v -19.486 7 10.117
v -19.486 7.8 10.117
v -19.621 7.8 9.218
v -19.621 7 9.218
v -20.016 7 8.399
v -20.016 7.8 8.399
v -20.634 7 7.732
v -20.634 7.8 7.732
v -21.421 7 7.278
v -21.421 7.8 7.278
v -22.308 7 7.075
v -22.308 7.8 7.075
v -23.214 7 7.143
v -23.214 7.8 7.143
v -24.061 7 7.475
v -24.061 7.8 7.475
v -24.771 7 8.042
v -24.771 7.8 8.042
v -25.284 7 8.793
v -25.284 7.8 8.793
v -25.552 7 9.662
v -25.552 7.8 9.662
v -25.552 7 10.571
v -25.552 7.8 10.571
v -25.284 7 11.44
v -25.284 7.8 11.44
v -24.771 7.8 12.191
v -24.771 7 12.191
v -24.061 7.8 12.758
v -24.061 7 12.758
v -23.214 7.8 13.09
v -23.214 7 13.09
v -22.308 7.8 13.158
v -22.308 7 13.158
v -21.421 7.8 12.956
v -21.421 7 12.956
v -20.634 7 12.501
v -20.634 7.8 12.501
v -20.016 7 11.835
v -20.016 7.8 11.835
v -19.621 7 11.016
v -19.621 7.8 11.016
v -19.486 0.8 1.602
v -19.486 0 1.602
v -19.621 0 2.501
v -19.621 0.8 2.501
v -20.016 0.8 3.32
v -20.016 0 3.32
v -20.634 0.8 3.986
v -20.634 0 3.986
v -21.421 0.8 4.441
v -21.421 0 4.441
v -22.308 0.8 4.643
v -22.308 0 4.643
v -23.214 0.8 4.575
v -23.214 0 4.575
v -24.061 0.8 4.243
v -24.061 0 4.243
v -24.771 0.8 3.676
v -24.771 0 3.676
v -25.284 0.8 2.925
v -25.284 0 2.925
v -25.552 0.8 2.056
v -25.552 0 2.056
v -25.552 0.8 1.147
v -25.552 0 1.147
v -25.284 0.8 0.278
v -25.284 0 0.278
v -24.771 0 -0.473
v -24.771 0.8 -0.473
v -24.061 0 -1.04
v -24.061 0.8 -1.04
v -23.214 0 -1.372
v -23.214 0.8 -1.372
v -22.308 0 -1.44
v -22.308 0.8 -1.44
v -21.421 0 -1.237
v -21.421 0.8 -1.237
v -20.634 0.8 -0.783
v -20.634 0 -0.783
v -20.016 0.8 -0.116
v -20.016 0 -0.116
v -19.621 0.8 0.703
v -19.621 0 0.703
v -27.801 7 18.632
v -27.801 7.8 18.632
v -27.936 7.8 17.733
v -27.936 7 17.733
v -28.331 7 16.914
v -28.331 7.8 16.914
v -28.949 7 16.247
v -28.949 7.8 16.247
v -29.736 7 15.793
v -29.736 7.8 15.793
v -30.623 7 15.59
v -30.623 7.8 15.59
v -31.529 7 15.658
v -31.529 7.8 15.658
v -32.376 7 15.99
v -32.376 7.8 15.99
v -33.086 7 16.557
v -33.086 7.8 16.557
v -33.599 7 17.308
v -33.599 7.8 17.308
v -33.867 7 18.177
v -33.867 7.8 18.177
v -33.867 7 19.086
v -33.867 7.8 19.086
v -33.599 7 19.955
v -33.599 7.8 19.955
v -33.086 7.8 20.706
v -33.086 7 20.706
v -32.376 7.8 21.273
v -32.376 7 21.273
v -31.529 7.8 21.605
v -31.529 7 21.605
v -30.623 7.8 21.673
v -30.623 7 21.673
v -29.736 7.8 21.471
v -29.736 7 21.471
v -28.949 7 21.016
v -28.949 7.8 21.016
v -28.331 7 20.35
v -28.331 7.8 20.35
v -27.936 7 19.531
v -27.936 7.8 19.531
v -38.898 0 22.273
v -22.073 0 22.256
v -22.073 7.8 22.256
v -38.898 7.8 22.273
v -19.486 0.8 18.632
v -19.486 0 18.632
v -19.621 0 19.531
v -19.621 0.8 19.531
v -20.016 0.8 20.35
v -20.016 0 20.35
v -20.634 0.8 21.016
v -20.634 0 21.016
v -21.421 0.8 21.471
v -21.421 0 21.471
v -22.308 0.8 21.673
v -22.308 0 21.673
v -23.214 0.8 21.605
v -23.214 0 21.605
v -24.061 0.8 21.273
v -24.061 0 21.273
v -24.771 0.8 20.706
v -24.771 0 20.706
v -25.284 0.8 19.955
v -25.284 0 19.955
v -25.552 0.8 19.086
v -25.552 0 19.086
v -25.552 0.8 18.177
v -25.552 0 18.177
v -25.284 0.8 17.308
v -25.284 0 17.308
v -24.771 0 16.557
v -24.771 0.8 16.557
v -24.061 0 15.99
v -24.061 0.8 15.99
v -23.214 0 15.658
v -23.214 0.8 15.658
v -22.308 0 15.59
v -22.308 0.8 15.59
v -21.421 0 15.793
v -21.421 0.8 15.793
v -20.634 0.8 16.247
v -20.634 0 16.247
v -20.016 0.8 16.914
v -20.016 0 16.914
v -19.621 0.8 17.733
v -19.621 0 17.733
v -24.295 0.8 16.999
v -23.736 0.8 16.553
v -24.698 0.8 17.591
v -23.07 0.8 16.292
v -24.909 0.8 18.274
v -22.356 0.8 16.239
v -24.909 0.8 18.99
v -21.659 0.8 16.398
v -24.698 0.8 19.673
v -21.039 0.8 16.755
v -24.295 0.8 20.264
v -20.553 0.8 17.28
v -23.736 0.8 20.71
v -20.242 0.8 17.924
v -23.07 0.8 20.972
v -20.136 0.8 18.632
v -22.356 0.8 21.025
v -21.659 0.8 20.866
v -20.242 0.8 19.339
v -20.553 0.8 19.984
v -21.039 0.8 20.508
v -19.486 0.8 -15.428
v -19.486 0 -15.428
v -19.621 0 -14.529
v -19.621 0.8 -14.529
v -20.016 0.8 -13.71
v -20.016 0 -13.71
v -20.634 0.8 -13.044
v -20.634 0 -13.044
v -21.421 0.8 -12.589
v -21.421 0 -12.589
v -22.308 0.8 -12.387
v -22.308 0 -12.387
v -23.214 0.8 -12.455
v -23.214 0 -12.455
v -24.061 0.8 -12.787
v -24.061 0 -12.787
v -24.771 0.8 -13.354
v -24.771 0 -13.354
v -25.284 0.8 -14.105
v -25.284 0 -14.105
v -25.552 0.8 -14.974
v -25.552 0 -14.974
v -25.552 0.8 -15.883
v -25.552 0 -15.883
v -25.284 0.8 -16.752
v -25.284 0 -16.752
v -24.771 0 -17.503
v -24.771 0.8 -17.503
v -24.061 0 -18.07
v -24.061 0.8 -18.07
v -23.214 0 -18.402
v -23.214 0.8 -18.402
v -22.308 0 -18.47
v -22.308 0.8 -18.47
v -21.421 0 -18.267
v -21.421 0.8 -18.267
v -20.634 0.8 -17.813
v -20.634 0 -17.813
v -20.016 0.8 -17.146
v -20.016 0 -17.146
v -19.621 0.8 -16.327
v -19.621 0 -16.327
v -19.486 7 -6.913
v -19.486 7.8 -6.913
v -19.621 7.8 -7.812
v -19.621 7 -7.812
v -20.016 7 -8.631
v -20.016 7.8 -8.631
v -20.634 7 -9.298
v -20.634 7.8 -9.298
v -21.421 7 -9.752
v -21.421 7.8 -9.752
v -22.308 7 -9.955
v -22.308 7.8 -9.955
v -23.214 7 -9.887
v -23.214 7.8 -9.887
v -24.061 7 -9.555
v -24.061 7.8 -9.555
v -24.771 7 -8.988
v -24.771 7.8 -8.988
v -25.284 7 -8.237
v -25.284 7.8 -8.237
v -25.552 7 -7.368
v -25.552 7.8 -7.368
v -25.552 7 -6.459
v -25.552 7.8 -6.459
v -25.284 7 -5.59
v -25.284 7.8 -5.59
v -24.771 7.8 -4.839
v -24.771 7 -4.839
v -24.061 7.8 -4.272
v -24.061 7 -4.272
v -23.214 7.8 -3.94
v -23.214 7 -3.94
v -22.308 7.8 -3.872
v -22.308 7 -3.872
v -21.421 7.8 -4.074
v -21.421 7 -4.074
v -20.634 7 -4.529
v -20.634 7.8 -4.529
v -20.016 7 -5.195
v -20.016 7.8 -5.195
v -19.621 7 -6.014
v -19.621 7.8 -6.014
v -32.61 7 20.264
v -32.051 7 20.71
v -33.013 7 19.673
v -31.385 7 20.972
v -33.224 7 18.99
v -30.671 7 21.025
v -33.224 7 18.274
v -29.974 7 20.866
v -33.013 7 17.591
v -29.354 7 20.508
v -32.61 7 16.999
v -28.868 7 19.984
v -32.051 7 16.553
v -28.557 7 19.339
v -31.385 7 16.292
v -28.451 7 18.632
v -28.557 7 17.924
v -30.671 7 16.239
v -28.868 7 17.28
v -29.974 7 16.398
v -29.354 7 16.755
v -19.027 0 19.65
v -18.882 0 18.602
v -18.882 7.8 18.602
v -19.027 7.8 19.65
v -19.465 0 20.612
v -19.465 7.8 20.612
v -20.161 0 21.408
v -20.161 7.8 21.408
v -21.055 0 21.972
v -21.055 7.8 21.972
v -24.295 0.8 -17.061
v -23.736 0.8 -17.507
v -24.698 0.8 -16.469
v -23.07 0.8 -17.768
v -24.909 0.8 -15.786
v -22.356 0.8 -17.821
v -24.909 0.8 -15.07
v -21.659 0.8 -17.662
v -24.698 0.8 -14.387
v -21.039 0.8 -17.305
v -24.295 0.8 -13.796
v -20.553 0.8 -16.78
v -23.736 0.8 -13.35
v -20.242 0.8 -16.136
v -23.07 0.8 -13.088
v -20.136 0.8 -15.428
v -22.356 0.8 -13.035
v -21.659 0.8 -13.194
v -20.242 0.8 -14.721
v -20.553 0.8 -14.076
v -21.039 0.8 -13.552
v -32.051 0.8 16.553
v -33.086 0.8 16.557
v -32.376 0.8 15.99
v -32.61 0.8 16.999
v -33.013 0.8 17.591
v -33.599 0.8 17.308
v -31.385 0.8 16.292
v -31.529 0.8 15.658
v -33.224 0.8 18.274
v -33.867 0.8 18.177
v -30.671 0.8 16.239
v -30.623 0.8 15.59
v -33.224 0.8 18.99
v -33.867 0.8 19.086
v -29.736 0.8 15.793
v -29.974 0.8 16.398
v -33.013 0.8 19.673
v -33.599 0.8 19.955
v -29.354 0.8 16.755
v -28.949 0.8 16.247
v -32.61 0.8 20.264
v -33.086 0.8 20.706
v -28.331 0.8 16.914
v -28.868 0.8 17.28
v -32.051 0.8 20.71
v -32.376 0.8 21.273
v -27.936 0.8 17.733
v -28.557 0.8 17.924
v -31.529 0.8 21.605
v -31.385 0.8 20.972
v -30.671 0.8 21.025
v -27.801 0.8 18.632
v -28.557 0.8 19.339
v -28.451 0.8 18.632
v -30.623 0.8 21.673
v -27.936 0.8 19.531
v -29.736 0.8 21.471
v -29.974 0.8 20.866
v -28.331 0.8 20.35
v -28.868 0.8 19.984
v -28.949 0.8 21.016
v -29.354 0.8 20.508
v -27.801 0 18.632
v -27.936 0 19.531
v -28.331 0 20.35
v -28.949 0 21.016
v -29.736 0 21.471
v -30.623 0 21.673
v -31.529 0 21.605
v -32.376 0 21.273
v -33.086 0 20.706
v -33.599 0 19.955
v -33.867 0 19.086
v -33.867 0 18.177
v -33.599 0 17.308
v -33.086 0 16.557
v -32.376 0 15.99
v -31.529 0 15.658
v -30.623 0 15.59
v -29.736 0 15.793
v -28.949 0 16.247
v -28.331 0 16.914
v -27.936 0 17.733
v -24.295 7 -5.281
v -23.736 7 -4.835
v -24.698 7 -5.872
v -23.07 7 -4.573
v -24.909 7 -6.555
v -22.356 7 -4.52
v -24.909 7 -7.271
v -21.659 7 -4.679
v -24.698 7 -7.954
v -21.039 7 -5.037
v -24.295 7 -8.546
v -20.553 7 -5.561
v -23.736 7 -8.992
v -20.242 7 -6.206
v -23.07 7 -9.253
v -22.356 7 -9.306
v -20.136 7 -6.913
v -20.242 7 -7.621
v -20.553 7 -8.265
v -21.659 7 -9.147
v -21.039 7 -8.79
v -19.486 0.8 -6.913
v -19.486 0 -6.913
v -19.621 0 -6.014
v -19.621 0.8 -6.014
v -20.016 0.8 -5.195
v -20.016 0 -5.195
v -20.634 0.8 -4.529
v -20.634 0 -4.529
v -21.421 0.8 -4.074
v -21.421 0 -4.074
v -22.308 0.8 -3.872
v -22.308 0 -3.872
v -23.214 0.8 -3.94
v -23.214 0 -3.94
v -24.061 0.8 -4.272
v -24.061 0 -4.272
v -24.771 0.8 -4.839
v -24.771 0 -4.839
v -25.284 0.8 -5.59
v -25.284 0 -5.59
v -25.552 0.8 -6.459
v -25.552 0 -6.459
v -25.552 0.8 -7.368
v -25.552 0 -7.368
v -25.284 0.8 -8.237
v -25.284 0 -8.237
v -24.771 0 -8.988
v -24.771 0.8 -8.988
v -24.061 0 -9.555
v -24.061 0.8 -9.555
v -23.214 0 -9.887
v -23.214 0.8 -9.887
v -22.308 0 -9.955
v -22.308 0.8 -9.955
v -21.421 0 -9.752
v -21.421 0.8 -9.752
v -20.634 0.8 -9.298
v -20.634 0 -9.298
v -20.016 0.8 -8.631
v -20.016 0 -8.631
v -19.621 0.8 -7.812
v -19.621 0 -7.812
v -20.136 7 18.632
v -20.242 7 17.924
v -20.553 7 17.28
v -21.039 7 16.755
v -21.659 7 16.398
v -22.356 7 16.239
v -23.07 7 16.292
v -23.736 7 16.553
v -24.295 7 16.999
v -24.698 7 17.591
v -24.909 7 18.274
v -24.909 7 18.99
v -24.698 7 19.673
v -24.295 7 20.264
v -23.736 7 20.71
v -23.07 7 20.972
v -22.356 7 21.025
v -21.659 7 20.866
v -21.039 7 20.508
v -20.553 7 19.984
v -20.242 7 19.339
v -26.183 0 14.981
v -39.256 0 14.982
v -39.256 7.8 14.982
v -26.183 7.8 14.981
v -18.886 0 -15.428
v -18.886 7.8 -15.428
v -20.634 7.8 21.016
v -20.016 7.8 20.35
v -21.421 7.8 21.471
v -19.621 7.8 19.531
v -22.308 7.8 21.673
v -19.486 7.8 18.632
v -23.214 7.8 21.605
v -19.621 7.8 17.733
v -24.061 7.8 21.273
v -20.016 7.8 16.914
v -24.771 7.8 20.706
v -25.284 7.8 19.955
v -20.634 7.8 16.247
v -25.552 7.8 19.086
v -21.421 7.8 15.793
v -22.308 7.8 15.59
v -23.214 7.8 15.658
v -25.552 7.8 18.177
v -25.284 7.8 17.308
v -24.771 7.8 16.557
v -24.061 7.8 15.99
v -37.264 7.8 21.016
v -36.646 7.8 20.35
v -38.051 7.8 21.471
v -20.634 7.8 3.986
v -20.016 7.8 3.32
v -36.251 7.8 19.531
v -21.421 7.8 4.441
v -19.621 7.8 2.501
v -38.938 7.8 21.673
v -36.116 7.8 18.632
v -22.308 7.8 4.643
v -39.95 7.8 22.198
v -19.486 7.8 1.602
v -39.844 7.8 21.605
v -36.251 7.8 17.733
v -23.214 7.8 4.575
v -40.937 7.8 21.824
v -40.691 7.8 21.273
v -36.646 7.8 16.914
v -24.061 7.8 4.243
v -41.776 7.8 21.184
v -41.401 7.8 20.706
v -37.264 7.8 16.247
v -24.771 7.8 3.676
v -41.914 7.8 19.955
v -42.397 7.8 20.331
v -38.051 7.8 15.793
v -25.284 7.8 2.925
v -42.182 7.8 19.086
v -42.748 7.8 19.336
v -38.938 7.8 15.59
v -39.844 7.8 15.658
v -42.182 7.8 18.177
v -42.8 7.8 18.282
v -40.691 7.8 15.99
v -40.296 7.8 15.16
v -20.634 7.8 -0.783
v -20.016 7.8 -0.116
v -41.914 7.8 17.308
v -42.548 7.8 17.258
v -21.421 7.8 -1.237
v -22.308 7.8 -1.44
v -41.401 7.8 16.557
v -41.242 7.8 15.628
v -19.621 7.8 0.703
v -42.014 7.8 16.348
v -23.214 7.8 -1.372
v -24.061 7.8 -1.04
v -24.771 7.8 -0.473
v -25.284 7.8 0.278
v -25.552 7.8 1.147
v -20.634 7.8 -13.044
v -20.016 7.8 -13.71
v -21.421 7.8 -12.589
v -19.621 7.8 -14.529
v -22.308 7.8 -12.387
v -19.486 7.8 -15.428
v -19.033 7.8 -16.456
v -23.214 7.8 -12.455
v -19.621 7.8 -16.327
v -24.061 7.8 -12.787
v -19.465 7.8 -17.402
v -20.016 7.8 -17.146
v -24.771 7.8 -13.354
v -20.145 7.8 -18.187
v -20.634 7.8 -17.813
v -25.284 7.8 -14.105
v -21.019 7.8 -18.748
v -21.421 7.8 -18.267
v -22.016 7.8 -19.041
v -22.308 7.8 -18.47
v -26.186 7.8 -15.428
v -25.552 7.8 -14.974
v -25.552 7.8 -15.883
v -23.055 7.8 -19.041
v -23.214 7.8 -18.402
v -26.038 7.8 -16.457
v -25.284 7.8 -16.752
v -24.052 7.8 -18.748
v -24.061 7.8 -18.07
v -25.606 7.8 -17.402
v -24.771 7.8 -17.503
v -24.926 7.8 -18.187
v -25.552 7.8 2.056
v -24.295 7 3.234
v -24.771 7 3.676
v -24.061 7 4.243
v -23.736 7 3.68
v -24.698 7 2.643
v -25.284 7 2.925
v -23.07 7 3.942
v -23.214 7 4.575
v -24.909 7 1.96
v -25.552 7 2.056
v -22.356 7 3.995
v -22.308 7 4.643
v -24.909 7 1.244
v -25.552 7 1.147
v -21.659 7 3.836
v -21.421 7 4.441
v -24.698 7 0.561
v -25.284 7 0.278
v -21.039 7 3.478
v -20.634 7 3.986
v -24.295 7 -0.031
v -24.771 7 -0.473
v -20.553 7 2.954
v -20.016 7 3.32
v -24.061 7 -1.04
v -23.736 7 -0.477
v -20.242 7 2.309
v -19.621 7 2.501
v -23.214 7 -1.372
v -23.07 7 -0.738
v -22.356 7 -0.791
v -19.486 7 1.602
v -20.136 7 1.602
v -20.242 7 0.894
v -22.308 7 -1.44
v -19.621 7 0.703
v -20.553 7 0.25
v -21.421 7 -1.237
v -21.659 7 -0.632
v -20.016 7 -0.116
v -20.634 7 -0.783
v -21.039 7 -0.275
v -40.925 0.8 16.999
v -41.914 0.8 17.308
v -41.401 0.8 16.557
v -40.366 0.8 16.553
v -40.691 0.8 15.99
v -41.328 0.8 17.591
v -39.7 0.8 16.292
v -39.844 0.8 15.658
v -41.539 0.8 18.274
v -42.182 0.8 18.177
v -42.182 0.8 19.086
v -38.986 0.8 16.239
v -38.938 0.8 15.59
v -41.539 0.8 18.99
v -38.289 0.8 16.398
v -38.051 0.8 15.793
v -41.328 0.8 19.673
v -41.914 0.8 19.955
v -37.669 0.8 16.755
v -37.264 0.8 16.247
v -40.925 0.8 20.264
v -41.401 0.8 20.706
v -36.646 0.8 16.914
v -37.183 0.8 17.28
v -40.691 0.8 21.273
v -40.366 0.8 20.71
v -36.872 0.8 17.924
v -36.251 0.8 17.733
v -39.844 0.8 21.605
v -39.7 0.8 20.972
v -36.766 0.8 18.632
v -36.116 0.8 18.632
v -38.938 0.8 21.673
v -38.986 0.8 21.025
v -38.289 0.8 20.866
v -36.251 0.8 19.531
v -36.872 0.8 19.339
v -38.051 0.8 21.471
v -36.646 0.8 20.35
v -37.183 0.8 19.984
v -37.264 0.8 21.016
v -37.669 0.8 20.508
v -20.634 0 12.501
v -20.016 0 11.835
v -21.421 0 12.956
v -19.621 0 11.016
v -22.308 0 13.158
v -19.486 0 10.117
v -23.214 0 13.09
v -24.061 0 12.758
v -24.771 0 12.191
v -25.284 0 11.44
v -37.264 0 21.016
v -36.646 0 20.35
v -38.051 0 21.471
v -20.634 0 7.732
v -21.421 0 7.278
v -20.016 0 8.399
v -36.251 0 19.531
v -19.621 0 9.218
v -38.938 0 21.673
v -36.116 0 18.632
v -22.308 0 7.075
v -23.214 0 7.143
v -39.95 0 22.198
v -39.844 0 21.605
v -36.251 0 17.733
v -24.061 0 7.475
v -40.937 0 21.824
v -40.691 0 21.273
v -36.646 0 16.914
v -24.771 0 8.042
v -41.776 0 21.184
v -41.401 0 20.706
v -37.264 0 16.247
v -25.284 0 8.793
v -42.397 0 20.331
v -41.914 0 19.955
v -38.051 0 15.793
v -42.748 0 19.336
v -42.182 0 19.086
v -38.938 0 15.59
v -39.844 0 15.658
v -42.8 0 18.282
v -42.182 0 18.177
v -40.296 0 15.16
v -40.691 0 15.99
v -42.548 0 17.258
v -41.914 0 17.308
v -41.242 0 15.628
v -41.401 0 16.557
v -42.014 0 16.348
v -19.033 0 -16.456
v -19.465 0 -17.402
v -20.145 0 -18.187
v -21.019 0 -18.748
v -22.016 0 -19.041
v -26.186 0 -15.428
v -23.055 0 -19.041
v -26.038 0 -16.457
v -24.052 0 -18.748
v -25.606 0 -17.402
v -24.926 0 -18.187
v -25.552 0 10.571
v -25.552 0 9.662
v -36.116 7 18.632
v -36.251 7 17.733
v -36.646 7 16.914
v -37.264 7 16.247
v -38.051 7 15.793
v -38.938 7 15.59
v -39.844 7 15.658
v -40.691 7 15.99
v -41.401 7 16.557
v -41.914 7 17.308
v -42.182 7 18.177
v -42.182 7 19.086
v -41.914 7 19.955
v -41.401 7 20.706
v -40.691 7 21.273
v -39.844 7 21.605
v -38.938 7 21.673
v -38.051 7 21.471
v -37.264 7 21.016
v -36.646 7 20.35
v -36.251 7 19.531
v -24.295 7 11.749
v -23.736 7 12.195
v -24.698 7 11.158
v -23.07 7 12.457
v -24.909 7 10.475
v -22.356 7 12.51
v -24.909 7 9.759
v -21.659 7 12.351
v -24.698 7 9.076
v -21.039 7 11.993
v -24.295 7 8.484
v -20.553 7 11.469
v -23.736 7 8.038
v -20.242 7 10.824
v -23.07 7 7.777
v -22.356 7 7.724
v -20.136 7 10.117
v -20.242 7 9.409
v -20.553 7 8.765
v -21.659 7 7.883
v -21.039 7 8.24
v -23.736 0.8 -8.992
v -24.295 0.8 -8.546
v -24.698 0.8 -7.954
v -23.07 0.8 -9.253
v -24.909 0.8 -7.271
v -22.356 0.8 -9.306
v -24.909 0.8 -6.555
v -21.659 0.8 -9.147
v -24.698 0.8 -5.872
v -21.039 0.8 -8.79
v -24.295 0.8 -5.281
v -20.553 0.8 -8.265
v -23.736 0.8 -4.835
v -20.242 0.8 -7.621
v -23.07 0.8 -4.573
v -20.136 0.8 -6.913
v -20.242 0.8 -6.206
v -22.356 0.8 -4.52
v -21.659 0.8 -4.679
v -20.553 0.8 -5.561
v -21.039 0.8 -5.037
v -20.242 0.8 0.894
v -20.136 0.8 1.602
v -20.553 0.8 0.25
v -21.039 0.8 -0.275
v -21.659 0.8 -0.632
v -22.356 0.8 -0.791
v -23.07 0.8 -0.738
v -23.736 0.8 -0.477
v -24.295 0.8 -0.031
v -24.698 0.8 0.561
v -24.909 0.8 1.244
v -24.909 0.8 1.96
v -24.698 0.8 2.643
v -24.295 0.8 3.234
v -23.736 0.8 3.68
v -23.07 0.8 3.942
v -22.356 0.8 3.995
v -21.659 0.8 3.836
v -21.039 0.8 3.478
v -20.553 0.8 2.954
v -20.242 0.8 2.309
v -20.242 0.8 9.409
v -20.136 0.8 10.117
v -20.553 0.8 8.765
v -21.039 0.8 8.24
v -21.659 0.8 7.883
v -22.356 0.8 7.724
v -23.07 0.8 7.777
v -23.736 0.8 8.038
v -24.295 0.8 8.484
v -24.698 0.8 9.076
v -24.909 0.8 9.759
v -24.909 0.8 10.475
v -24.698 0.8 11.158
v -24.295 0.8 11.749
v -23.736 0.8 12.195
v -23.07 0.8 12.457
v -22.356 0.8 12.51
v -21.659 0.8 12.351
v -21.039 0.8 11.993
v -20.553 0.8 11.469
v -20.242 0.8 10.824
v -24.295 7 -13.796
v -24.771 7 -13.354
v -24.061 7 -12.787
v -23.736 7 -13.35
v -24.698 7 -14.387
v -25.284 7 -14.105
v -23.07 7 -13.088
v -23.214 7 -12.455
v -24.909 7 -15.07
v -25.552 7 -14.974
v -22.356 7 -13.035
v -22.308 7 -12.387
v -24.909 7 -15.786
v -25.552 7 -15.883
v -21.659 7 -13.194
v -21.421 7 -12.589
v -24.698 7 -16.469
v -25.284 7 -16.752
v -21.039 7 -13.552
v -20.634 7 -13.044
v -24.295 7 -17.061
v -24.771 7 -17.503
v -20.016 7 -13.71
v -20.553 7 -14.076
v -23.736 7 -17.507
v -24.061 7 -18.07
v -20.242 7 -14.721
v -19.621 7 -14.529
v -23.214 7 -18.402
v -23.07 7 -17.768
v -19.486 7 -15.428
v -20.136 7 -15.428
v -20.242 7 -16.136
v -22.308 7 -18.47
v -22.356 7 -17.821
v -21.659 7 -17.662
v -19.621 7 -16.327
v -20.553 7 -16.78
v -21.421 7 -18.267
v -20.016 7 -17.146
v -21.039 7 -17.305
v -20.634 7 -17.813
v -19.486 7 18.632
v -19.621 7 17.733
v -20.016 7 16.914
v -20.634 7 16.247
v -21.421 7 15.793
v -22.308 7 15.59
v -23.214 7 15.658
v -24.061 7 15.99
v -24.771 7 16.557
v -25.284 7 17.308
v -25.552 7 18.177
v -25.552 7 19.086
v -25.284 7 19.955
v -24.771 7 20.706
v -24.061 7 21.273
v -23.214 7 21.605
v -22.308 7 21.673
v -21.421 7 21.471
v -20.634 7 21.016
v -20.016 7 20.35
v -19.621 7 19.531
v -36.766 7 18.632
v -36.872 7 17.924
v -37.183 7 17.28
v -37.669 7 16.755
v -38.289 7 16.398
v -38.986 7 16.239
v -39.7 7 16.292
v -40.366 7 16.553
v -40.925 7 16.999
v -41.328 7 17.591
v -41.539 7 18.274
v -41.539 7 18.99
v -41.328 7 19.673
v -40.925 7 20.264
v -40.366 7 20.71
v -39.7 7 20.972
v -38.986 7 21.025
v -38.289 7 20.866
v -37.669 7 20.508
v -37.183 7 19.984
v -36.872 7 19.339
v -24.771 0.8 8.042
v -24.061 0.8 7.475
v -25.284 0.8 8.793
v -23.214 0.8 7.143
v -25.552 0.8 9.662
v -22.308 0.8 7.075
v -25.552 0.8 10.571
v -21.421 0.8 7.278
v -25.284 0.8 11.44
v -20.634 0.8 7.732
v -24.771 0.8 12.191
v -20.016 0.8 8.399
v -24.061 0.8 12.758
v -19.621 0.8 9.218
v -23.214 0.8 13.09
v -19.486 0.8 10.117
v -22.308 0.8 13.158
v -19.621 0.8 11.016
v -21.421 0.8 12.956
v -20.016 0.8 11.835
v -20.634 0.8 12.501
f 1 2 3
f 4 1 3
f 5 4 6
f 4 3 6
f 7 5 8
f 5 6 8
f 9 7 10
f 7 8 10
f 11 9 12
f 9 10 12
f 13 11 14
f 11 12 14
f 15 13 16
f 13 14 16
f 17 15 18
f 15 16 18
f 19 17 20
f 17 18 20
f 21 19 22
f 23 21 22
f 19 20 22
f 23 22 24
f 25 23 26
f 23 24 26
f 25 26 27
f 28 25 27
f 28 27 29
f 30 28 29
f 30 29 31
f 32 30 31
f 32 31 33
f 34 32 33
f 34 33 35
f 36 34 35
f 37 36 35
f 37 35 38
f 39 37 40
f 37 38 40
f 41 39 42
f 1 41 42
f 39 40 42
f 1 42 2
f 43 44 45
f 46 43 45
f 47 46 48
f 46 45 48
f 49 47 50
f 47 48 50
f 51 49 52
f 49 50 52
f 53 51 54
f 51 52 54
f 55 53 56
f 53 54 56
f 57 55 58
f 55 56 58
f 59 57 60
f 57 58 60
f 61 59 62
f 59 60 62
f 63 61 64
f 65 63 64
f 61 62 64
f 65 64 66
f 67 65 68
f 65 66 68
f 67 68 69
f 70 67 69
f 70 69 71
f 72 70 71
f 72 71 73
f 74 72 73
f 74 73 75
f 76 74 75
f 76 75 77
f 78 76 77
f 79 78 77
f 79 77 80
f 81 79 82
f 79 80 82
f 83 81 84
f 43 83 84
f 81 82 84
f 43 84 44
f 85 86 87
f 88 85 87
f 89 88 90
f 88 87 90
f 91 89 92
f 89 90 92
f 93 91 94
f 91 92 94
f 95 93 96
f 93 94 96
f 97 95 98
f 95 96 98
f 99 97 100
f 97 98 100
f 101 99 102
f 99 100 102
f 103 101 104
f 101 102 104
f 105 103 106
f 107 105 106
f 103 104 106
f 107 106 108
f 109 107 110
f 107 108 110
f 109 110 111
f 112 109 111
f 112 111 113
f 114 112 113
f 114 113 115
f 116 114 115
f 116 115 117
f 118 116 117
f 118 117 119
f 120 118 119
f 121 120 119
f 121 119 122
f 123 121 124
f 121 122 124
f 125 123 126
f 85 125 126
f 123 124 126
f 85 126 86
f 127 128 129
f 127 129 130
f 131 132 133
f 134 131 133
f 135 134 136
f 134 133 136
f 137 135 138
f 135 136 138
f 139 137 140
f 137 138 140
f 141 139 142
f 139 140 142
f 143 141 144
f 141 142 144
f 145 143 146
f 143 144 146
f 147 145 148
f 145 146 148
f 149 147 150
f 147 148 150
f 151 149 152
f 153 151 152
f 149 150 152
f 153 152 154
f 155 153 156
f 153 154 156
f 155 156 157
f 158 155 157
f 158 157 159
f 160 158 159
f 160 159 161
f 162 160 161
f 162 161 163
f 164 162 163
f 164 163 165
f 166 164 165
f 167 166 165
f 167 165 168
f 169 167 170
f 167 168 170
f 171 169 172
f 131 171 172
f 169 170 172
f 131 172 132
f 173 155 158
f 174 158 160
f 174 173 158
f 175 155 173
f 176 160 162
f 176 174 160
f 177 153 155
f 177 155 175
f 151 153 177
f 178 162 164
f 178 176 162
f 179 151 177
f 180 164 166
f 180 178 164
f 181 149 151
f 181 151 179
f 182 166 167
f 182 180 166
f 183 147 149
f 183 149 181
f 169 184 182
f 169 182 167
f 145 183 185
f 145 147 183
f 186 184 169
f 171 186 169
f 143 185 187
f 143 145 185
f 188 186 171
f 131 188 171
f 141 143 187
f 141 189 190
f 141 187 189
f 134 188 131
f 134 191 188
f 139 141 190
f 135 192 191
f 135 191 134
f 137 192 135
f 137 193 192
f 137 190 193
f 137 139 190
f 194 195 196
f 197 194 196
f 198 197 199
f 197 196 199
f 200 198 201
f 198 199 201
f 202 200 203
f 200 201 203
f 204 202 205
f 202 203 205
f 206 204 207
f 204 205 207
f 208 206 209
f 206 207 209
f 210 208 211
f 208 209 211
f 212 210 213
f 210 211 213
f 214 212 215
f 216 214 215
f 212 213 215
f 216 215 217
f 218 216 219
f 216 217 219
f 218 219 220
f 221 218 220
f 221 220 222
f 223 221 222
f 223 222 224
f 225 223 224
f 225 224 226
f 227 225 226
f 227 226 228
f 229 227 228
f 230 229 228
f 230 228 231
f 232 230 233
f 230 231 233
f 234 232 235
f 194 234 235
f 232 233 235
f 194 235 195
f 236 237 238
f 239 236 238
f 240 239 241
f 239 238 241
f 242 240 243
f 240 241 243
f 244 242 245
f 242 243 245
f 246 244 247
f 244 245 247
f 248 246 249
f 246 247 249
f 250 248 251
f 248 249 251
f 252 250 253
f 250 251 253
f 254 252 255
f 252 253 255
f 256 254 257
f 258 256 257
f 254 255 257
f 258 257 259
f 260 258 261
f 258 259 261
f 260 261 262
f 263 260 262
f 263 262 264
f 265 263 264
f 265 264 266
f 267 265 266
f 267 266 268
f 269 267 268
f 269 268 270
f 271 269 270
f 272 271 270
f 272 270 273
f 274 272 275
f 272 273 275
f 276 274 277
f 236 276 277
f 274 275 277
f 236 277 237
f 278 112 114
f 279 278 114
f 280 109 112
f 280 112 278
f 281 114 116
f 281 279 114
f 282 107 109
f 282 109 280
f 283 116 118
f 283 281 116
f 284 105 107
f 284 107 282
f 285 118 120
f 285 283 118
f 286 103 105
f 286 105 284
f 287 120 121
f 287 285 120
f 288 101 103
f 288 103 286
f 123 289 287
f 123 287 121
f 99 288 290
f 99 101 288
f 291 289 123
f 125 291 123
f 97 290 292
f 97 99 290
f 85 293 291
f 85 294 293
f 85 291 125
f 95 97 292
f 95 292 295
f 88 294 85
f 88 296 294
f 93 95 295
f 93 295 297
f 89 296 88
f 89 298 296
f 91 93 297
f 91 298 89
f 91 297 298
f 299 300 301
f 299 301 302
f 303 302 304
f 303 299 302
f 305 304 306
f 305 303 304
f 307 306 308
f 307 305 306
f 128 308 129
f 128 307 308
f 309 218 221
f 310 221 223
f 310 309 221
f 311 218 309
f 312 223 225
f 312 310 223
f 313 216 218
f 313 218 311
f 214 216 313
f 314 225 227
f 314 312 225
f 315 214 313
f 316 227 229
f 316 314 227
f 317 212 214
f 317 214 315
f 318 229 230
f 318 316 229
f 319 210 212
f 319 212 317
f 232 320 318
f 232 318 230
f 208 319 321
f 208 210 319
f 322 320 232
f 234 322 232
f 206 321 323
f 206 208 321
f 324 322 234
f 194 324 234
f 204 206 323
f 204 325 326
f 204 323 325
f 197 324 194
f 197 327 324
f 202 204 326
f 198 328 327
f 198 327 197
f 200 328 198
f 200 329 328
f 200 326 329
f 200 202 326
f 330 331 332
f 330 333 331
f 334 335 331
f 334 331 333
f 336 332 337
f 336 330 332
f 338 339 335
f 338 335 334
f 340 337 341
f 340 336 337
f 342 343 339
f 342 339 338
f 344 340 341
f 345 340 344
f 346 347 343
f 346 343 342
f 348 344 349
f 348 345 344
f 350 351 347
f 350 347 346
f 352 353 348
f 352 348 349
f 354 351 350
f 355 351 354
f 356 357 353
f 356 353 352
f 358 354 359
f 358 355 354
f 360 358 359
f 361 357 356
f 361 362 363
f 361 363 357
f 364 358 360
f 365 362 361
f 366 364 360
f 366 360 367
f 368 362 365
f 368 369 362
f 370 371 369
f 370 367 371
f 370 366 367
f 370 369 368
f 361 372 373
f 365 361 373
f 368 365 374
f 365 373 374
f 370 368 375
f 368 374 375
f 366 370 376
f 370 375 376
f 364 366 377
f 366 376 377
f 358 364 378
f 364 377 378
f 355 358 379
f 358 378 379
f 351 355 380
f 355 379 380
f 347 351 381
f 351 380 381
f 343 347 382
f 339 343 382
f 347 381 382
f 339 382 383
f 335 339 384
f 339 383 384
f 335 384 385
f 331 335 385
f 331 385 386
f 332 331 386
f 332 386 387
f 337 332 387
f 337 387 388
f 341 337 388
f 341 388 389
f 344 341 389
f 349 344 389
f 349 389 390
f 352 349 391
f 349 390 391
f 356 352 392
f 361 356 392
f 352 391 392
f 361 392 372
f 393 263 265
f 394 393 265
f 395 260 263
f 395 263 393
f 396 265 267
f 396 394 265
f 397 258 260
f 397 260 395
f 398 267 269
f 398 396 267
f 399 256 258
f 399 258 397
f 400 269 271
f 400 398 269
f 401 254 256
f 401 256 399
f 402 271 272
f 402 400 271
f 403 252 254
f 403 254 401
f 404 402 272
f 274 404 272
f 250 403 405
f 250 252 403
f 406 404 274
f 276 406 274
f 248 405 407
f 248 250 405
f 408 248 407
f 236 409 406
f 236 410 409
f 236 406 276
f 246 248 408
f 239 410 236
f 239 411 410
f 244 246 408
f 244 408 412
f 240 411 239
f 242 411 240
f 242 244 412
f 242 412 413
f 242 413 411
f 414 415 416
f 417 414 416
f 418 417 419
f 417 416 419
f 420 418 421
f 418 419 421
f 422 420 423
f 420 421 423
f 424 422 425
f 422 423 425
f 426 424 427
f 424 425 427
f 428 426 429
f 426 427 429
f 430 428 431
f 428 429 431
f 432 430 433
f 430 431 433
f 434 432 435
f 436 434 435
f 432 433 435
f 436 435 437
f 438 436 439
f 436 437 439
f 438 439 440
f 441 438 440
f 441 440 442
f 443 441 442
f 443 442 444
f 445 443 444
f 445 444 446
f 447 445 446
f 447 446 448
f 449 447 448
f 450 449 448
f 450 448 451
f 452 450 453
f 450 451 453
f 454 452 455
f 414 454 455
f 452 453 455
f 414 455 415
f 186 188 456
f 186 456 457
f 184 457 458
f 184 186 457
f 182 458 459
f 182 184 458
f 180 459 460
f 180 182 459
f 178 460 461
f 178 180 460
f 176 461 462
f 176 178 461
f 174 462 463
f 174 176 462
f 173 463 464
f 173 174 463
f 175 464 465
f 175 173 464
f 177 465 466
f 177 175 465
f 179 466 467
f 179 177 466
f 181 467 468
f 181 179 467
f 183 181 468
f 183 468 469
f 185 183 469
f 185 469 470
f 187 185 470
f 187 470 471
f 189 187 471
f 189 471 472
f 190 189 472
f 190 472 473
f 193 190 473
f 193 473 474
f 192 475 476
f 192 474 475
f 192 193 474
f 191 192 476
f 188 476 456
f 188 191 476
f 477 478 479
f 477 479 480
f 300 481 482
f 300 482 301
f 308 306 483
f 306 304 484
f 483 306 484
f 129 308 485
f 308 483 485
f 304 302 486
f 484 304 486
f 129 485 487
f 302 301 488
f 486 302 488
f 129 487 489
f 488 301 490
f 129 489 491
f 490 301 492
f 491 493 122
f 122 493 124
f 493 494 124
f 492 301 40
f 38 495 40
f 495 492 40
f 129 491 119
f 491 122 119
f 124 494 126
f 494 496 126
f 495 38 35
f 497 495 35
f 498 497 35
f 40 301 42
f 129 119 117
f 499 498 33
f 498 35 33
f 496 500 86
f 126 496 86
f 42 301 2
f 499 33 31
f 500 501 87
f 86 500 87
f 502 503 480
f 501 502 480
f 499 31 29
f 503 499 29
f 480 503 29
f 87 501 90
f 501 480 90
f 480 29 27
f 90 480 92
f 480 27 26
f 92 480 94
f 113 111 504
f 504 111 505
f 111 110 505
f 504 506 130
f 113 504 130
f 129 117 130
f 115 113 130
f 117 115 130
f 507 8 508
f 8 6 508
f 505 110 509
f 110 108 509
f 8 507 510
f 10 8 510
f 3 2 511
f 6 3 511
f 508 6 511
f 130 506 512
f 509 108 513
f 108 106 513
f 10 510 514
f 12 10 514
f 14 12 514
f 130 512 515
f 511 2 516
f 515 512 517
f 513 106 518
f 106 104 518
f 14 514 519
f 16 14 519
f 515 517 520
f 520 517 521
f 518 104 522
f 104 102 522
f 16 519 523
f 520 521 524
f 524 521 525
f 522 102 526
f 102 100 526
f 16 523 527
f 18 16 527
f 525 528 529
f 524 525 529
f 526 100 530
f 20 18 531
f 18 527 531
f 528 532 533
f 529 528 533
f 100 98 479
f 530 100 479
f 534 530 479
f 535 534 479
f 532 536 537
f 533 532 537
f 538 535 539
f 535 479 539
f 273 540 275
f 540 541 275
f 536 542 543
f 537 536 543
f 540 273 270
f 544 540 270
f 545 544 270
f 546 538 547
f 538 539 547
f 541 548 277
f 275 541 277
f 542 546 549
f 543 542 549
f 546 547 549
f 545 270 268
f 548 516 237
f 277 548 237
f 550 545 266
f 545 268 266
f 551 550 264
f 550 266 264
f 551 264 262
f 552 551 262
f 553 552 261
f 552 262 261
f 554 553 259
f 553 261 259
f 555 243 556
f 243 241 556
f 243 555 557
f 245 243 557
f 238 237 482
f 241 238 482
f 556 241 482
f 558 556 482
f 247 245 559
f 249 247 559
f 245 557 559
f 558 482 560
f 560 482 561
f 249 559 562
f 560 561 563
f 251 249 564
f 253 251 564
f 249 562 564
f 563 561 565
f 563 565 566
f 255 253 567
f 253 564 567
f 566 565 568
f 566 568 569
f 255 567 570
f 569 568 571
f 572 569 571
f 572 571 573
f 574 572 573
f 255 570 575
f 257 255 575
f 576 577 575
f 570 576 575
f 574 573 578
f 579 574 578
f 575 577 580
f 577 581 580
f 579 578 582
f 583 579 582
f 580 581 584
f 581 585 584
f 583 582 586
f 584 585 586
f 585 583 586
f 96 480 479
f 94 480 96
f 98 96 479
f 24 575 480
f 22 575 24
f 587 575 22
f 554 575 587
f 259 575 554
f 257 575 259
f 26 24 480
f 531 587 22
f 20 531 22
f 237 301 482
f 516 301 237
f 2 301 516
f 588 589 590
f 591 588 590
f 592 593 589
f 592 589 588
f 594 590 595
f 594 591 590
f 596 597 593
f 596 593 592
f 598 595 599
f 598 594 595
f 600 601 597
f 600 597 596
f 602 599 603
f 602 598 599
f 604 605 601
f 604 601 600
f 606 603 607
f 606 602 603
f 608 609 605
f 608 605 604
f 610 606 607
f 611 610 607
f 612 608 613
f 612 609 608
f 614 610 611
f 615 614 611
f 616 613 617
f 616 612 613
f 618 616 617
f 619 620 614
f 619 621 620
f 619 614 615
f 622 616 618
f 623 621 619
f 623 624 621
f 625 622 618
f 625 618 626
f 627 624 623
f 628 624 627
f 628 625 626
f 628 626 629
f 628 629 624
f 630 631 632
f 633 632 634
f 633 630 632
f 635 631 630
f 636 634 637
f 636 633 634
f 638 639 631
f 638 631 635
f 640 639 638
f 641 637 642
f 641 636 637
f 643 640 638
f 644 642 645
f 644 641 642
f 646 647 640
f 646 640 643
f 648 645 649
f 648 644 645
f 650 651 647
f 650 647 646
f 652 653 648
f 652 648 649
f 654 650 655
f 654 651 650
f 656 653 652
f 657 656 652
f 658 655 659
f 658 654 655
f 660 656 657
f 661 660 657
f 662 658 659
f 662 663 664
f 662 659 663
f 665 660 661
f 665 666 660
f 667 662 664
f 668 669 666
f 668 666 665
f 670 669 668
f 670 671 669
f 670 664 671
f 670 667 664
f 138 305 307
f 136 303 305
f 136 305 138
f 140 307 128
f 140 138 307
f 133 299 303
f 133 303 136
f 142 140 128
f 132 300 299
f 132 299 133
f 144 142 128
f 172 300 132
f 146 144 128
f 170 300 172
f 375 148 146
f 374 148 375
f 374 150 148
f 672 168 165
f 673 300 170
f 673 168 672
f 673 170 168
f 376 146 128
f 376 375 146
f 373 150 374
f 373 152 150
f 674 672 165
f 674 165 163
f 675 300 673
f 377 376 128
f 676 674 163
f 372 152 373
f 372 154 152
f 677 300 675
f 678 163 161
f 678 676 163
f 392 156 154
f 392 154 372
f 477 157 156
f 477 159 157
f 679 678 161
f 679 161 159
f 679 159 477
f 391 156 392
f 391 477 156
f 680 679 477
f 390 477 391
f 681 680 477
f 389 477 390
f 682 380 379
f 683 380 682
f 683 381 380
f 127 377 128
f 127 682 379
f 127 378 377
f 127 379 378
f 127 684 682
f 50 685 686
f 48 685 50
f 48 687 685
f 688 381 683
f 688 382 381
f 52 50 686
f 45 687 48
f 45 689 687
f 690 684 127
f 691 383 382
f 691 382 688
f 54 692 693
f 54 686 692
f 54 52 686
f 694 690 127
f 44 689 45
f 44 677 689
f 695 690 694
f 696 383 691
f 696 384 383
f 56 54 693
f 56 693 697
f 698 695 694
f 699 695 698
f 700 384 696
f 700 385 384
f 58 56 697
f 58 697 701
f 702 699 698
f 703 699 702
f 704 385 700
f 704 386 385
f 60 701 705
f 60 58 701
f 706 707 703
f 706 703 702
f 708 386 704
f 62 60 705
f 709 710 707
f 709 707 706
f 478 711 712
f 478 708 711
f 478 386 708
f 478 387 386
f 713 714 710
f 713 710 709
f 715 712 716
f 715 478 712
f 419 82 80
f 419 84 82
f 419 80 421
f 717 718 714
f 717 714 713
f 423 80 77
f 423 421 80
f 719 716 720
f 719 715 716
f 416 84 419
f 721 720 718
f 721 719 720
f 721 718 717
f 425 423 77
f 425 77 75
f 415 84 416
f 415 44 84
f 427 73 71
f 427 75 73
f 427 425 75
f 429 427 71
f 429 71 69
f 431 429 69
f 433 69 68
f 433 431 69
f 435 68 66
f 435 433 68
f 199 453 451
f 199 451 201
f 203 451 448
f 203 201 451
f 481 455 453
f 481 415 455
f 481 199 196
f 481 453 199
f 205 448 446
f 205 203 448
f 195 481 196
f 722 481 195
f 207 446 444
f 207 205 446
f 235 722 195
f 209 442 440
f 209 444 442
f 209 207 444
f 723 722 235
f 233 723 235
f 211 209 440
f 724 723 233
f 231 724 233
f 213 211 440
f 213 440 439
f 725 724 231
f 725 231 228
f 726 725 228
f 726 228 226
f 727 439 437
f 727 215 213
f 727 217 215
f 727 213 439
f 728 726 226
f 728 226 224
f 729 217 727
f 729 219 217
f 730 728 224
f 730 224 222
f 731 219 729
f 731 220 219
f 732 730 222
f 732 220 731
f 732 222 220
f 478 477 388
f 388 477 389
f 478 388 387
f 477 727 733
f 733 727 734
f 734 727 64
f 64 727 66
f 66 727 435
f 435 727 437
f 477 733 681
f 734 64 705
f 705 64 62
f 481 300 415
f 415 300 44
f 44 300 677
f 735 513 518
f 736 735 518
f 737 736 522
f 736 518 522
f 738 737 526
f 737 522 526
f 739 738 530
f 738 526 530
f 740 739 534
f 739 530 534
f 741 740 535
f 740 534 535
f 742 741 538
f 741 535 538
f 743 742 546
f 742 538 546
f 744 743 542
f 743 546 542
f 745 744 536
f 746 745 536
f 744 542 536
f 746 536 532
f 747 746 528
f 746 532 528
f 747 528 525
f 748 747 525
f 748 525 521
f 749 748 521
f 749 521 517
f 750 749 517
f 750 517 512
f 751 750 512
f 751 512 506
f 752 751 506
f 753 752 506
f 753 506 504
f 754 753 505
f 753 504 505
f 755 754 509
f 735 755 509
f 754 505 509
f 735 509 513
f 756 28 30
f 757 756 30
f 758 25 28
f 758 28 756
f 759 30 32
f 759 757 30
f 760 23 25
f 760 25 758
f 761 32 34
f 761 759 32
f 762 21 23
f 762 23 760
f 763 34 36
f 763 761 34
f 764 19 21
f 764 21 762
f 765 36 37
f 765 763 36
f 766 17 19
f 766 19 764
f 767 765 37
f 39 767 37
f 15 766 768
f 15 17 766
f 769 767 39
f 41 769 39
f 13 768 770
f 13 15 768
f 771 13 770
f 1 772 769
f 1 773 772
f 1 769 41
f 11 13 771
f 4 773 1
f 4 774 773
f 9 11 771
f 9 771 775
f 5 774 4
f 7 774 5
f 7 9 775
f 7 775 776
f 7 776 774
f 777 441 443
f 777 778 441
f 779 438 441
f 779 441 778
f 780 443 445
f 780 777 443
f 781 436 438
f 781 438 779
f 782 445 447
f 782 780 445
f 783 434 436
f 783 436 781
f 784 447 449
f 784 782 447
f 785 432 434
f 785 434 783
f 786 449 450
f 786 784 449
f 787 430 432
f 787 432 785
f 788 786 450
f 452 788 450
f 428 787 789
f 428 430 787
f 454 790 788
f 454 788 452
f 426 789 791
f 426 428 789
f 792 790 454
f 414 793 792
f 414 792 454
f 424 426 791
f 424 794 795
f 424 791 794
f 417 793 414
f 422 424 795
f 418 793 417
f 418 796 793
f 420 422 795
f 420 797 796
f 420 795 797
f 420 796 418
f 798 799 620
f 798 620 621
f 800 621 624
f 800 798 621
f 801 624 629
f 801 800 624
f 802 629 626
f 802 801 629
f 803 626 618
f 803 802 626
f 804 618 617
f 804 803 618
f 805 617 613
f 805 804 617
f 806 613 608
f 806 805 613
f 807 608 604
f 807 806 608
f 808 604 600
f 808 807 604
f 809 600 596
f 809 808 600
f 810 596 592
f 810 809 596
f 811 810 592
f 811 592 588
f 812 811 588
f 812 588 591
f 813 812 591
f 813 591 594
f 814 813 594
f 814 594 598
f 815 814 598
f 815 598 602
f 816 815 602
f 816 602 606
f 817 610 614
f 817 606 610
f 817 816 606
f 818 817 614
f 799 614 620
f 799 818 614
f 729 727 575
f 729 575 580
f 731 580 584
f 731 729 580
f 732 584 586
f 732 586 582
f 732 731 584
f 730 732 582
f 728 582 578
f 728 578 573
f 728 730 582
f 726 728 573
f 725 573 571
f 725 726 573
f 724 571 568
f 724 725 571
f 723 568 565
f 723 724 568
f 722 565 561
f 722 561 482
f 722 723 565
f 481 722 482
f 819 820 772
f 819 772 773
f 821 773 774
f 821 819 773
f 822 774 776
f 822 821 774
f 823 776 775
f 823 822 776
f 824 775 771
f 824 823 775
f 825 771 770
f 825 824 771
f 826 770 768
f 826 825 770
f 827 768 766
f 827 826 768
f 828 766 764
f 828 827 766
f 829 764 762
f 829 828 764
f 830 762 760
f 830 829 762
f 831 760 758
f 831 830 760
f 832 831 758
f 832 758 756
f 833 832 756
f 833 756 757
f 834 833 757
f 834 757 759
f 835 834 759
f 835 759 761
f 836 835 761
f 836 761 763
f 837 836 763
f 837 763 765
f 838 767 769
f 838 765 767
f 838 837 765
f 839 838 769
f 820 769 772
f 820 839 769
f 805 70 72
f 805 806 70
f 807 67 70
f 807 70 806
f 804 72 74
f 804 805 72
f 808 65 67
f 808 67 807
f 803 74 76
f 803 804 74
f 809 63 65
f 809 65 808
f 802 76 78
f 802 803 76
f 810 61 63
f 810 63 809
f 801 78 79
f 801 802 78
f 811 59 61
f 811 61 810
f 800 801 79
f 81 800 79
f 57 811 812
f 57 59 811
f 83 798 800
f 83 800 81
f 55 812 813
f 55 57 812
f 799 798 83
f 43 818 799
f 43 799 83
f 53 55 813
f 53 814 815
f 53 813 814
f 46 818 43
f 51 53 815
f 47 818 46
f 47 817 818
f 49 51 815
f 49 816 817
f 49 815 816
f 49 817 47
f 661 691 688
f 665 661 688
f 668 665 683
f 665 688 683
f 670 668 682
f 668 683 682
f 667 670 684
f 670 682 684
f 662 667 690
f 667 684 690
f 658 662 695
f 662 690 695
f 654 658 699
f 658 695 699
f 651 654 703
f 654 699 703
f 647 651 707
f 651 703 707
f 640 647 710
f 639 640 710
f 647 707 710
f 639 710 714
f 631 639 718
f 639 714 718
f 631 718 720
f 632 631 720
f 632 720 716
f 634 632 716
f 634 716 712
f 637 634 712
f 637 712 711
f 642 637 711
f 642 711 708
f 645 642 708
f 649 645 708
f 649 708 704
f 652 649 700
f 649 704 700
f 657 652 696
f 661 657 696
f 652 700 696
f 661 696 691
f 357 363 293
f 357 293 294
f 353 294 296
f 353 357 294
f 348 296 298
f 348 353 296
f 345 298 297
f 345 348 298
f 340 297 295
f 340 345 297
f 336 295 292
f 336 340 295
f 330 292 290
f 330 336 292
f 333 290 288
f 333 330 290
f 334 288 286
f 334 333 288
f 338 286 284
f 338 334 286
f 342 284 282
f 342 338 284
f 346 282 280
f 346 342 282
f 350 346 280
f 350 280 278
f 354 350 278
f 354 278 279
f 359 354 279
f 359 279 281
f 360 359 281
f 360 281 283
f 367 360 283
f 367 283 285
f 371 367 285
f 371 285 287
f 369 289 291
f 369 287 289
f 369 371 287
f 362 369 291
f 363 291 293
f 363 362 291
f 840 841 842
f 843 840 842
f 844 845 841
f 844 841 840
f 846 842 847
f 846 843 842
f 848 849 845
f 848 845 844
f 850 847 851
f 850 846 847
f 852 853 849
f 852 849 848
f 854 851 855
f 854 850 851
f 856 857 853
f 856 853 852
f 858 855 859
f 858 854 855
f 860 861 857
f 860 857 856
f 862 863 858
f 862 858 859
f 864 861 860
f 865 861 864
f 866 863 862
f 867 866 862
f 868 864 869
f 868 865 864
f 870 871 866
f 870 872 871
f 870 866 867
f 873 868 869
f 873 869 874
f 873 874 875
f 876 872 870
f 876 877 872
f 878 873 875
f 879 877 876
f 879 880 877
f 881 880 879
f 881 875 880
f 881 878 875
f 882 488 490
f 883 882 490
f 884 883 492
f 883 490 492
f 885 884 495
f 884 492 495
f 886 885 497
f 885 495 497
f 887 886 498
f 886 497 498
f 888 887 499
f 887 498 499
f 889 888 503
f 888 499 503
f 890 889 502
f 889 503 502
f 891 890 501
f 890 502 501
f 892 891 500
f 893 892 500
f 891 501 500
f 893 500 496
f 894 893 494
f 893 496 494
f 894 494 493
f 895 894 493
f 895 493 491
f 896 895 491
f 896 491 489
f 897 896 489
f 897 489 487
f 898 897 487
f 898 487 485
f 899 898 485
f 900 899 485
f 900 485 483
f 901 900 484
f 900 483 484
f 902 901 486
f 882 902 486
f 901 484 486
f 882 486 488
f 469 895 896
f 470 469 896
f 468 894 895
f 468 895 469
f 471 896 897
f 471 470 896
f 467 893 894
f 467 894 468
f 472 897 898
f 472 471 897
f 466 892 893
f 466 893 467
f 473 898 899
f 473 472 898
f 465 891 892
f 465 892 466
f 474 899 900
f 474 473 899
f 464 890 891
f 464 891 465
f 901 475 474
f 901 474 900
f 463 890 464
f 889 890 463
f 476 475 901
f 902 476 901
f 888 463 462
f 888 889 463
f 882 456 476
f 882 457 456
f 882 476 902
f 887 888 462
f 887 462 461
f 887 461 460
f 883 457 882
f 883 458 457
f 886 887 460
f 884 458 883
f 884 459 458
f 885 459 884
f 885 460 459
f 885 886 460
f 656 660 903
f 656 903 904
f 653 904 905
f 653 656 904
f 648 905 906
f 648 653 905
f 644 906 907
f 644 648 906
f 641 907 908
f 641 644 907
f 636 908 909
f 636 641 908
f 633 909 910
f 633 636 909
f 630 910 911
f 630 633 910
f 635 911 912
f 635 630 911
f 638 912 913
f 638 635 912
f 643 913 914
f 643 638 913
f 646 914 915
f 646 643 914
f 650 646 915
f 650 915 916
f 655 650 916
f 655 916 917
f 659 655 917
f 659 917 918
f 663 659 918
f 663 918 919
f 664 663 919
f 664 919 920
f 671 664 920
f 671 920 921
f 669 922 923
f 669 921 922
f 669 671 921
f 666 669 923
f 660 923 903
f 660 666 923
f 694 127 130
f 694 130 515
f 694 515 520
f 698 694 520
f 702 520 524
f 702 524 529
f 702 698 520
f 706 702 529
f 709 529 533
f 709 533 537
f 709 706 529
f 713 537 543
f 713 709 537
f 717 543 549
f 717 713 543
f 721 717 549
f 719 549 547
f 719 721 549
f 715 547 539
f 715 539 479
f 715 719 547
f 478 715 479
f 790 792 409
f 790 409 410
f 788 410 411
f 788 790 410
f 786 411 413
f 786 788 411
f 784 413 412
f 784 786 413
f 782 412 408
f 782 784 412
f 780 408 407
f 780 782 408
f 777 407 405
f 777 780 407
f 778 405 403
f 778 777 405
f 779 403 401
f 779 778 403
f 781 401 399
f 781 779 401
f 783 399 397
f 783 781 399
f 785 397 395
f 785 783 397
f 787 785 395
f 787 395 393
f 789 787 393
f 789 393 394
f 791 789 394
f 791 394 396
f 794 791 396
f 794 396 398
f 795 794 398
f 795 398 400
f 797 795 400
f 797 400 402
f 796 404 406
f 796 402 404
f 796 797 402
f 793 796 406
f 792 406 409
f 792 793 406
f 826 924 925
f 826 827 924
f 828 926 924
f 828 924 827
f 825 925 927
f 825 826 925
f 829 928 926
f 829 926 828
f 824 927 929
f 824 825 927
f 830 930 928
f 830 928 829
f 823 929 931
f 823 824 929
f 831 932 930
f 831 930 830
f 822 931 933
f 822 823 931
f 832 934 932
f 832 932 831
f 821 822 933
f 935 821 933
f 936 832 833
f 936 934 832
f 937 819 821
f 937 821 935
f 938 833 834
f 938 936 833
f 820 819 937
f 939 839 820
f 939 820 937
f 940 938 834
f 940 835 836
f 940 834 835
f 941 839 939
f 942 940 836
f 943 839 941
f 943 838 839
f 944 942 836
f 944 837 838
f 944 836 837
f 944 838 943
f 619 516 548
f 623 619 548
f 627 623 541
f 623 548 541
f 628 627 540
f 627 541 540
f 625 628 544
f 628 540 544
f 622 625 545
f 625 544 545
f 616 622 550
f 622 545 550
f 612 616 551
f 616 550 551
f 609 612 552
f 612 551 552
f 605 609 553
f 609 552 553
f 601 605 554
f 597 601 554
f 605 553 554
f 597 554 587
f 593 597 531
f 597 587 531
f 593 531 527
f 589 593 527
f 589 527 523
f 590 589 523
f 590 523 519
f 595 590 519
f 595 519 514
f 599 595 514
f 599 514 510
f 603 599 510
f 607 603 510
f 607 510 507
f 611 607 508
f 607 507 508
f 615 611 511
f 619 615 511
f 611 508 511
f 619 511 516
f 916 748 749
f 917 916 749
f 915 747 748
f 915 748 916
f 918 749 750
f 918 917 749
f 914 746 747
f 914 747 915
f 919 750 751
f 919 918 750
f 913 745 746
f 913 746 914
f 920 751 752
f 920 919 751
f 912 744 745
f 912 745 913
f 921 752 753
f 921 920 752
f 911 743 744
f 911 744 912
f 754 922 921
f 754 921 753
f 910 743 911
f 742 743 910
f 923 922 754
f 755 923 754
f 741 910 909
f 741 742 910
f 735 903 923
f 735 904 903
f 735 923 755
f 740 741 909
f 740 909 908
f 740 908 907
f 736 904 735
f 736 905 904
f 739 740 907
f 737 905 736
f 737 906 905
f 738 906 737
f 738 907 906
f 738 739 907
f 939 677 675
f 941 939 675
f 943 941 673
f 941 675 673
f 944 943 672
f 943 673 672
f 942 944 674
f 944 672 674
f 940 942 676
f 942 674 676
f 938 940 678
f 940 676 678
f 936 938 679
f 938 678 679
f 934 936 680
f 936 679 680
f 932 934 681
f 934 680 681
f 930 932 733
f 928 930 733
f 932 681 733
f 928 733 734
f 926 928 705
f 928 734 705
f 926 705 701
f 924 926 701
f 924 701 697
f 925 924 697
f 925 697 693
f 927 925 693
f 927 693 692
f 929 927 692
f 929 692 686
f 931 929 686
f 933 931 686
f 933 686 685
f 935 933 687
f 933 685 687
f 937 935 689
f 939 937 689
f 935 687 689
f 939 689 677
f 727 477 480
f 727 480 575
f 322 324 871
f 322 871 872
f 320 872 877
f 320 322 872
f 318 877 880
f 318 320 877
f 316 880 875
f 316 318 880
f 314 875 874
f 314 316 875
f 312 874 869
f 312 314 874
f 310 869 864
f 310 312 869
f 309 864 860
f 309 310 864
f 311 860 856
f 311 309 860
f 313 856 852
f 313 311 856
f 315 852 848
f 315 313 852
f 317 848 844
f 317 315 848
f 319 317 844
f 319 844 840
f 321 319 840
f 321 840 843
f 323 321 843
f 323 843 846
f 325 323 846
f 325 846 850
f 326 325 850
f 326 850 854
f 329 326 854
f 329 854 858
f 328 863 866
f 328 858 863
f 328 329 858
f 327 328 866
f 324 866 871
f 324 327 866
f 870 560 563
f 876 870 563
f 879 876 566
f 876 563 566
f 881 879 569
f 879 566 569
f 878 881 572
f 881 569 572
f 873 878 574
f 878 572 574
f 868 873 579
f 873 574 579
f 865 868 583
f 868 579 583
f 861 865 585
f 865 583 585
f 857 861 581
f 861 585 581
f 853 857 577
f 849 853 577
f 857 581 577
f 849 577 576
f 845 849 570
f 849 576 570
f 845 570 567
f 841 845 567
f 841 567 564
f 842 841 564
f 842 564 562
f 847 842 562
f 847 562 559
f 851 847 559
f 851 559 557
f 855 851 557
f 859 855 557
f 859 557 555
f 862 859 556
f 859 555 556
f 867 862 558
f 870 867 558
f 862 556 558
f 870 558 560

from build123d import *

# Parameters (mm, degrees)
SKETCH1_R           = 2.4
BOSS_EXTRUDE1_DEPTH = 7.8
SKETCH2_R           = 3.05
CUT_EXTRUDE1_DEPTH  = 0.8
SKETCH3_R           = 3.05
CUT_EXTRUDE2_DEPTH  = 0.8


with BuildPart() as part:
    # Sketch1 → Boss-Extrude1 (new body)
    with BuildSketch(Plane(origin=(0, 0, 0), x_dir=(1, 0, 0), z_dir=(0, 1, 0))):
        with BuildLine():
            Line((-39.256074834, -14.981858177), (-26.182604436, -14.980554672))
            Line((-26.182604436, -14.980554672), (-26.185636373, 15.428181457))
            ThreePointArc((-26.185636373, 15.428181457), (-22.535634636, 19.078177837), (-18.885638256, 15.428176099))
            Line((-18.885638256, 15.428176099), (-18.882245203, -18.602359628))
            ThreePointArc((-18.882245203, -18.602359628), (-19.783925456, -21.035198794), (-22.073348778, -22.255966806))
            Line((-22.073348778, -22.255966806), (-38.897547418, -22.273048621))
            ThreePointArc((-38.897547418, -22.273048621), (-42.812314517, -18.811138133), (-39.256074834, -14.981858177))
        make_face()
        with Locations((-39.165637315, -18.631821222)):
            Circle(SKETCH1_R, mode=Mode.SUBTRACT)
        with Locations((-30.850637315, -18.631821222)):
            Circle(SKETCH1_R, mode=Mode.SUBTRACT)
        with Locations((-22.535637315, -18.631821222)):
            Circle(SKETCH1_R, mode=Mode.SUBTRACT)
        with Locations((-22.535637315, 15.428178778)):
            Circle(SKETCH1_R, mode=Mode.SUBTRACT)
        with Locations((-22.535637315, 6.913178778)):
            Circle(SKETCH1_R, mode=Mode.SUBTRACT)
        with Locations((-22.535637315, -1.601821222)):
            Circle(SKETCH1_R, mode=Mode.SUBTRACT)
        with Locations((-22.535637315, -10.116821222)):
            Circle(SKETCH1_R, mode=Mode.SUBTRACT)
    extrude(amount=BOSS_EXTRUDE1_DEPTH)

    # Sketch2 → Cut-Extrude1 (cut)
    with BuildSketch(Plane(origin=(0, 7.8, 0), x_dir=(1, 0, 0), z_dir=(0, 1, 0))):
        with Locations((-39.165637315, -18.631821222)):
            Circle(SKETCH2_R)
        with Locations((-30.850637315, -18.631821222)):
            Circle(SKETCH2_R)
        with Locations((-22.535637315, -18.631821222)):
            Circle(SKETCH2_R)
        with Locations((-22.535637315, -10.116821222)):
            Circle(SKETCH2_R)
        with Locations((-22.535637315, -1.601821222)):
            Circle(SKETCH2_R)
        with Locations((-22.535637315, 6.913178778)):
            Circle(SKETCH2_R)
        with Locations((-22.535637315, 15.428178778)):
            Circle(SKETCH2_R)
    extrude(amount=-CUT_EXTRUDE1_DEPTH, mode=Mode.SUBTRACT)

    # Sketch3 → Cut-Extrude2 (cut)
    with BuildSketch(Plane.XZ):
        with Locations((-30.850637315, 18.631821222)):
            Circle(SKETCH3_R)
        with Locations((-39.165637315, 18.631821222)):
            Circle(SKETCH3_R)
        with Locations((-22.535637315, 18.631821222)):
            Circle(SKETCH3_R)
        with Locations((-22.535637315, 10.116821222)):
            Circle(SKETCH3_R)
        with Locations((-22.535637315, 1.601821222)):
            Circle(SKETCH3_R)
        with Locations((-22.535637315, -6.913178778)):
            Circle(SKETCH3_R)
        with Locations((-22.535637315, -15.428178778)):
            Circle(SKETCH3_R)
    extrude(amount=-CUT_EXTRUDE2_DEPTH, mode=Mode.SUBTRACT)


solid = part.part
